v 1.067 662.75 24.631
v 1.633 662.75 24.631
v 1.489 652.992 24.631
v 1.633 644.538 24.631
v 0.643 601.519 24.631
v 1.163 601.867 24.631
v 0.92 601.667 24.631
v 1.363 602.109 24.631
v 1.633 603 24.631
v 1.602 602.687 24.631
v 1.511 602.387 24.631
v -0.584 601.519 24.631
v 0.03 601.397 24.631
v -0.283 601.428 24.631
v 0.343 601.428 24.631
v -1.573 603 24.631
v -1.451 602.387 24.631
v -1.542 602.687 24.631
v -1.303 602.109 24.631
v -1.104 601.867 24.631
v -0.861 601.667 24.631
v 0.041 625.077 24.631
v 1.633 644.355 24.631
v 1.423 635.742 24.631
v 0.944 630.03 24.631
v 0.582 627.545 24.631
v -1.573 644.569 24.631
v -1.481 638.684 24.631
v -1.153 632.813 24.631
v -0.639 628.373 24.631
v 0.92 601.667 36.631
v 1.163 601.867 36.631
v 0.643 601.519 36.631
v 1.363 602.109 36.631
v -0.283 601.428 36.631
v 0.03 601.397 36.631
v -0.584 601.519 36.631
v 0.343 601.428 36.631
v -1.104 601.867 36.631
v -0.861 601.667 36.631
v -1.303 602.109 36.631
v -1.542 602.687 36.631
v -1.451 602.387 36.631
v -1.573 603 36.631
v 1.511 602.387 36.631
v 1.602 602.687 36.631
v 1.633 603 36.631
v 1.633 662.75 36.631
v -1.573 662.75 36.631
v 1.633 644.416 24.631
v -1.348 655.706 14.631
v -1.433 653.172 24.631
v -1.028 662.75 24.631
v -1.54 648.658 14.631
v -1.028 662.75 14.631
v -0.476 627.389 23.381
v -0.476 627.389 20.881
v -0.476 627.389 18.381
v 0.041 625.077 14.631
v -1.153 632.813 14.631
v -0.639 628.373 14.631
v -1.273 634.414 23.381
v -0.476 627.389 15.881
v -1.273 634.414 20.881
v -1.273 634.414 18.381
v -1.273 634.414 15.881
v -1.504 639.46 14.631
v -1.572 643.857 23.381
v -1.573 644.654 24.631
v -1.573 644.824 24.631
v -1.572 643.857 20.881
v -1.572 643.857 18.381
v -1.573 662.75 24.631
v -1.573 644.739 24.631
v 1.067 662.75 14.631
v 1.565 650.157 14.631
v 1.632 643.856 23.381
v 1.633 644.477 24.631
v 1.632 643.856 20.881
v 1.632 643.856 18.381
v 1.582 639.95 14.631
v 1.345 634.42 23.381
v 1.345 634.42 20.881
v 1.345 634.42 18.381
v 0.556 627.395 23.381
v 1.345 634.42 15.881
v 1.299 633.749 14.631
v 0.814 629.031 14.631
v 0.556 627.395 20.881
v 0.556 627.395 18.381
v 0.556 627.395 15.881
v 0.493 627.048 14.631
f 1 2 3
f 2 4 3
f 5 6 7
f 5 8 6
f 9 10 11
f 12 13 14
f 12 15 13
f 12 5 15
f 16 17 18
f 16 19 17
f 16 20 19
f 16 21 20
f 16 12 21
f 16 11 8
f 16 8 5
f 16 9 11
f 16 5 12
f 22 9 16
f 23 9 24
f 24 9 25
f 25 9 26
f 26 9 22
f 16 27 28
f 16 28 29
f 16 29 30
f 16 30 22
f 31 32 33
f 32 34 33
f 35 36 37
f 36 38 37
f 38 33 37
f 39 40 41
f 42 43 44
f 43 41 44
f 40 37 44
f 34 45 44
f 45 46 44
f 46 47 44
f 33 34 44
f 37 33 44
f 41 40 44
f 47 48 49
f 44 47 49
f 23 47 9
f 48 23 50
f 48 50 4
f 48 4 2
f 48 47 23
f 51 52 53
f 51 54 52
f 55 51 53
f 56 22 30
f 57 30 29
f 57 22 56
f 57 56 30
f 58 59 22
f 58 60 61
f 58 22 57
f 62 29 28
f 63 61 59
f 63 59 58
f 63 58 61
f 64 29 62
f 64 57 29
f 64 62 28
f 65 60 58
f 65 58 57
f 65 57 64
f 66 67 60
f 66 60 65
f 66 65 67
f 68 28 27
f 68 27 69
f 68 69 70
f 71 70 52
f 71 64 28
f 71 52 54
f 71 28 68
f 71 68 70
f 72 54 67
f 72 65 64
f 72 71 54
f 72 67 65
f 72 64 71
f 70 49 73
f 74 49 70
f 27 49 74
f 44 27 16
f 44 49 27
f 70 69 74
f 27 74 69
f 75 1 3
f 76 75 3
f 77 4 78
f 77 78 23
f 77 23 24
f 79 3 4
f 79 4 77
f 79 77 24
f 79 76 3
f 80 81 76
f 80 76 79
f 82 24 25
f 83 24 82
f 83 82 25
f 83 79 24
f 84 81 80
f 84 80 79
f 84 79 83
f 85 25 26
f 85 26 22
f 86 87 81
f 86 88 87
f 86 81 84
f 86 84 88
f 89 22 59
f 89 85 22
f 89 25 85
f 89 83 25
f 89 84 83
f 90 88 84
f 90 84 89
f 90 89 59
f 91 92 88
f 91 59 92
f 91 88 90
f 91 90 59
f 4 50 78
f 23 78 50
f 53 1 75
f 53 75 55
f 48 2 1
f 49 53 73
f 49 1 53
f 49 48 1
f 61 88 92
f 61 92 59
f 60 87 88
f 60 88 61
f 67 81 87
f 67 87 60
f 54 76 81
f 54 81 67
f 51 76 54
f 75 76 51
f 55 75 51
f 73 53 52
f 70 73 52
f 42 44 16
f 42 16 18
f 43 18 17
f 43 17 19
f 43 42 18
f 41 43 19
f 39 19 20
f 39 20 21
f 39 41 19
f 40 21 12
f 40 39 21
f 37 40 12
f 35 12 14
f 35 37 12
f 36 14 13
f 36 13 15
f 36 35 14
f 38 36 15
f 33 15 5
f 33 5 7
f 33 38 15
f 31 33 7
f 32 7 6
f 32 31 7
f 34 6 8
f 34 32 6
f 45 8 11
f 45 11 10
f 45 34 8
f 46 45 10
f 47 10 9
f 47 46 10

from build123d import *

# Parameters (mm, degrees)
BOSS_EXTRUDE1_DEPTH = 12
BOSS_EXTRUDE2_DEPTH = 10
SKETCH4_W           = 13.751659717
SKETCH4_H           = 46.366215506
CUT_EXTRUDE1_DEPTH  = 10
SKETCH5_W           = 8.283570047
SKETCH5_H           = 65.91855038
CUT_EXTRUDE2_DEPTH  = 12


with BuildPart() as part:
    # Sketch2 → Boss-Extrude1 (new body)
    with BuildSketch(Plane(origin=(0, 0, 24.631338753), x_dir=(-1, 0, 0), z_dir=(0, 0, -1))):
        with BuildLine():
            Line((1.823068058, 603), (1.823068058, 663))
            Line((1.823068058, 663), (-1.882857166, 663))
            Line((-1.882857166, 663), (-1.882857166, 603))
            ThreePointArc((-1.882857166, 603), (-0.029894554, 601.147037388), (1.823068058, 603))
        make_face()
    extrude(amount=-BOSS_EXTRUDE1_DEPTH)

    # Sketch3 → Boss-Extrude2 (add)
    with BuildSketch(Plane(origin=(0, 0, 24.631338753), x_dir=(-1, 0, 0), z_dir=(0, 0, -1))):
        with BuildLine():
            Line((1.264894076, 663), (-1.303734146, 663))
            add(Edge.make_bspline(
                [(-1.303734146, 663), (-1.370231135, 661.776635062), (-1.590250356, 657.449713113), (-1.807353062, 651.572171687), (-1.896585428, 645.372497792), (-1.86904968, 640.732879739), (-1.745534221, 636.874692995), (-1.562088565, 633.805492743), (-1.371788238, 631.514699269), (-1.110556109, 629.246267473), (-0.82006967, 627.376977333), (-0.524480825, 625.91989796), (-0.290142677, 624.999996337), (-0.11575841, 624.480032386), (-0.0414459, 624.290359908)],
                knots=[0.640306561, 0.640306561, 0.640306561, 0.640306561, 0.664641164, 0.726373771, 0.757240075, 0.788106379, 0.818972683, 0.834405835, 0.849838987, 0.865272139, 0.88070529, 0.888421866, 0.896138442, 0.901180622, 0.901180622, 0.901180622, 0.901180622], degree=3))
            add(Edge.make_bspline(
                [(-0.0414459, 624.290359908), (0.033082795, 624.479947544), (0.208059728, 624.999712352), (0.443446447, 625.919346223), (0.740696225, 627.376087666), (1.033313538, 629.245045426), (1.297131595, 631.513177934), (1.490043391, 633.803752969), (1.676987934, 636.872742091), (1.804901792, 640.730785516), (1.837726863, 645.370369162), (1.755562421, 651.570140757), (1.545143008, 657.448413886), (1.33002573, 661.776072077), (1.264894076, 663)],
                knots=[0.516530112, 0.516530112, 0.516530112, 0.516530112, 0.521572291, 0.529288867, 0.537005443, 0.552438595, 0.567871747, 0.583304899, 0.598738051, 0.629604354, 0.660470658, 0.691336962, 0.75306957, 0.777413882, 0.777413882, 0.777413882, 0.777413882], degree=3))
        make_face()
    extrude(amount=BOSS_EXTRUDE2_DEPTH)

    # Sketch4 → Cut-Extrude1 (cut)
    with BuildSketch(Plane(origin=(0, 0, 14.631338753), x_dir=(-1, 0, 0), z_dir=(0, 0, -1))):
        with Locations((-1.173878519, 643.806595501)):
            Rectangle(SKETCH4_W, SKETCH4_H)
        with BuildLine():
            Line((1.027790464, 662.75), (-1.066900471, 662.75))
            add(Edge.make_bspline(
                [(-1.066900471, 662.75), (-1.236503852, 659.603485126), (-1.378670819, 656.455796636), (-1.57969897, 650.156856184), (-1.640644161, 647.006539015), (-1.627793637, 642.280065577), (-1.605967013, 640.704411435), (-1.51576118, 637.5585905), (-1.447339544, 635.987803899), (-1.241955745, 632.852473359), (-1.105208785, 631.287909819), (-0.807374159, 628.949508907), (-0.693510346, 628.171370392), (-0.487056782, 627.00741033), (-0.412632368, 626.619934288), (-0.245133833, 625.846680816), (-0.152824444, 625.460833735), (-0.040997635, 625.076764299)],
                knots=[0, 0, 0, 0, 0.25, 0.25, 0.5, 0.5, 0.625, 0.625, 0.75, 0.75, 0.875, 0.875, 0.9375, 0.9375, 0.96875, 0.96875, 1, 1, 1, 1], degree=3))
            add(Edge.make_bspline(
                [(-0.040997635, 625.076764299), (0.070840901, 625.459248905), (0.163415052, 625.843948539), (0.33153675, 626.615305535), (0.406338832, 627.002048611), (0.614008944, 628.164202165), (0.728805435, 628.941690519), (1.029518166, 631.279177553), (1.168319449, 632.844593533), (1.37765883, 635.983274427), (1.448032565, 637.557347723), (1.541893042, 640.707003283), (1.565447656, 642.281912238), (1.583609245, 647.006821426), (1.526236009, 650.157618773), (1.332376457, 656.455957525), (1.193802364, 659.603511067), (1.027790464, 662.75)],
                knots=[0, 0, 0, 0, 0.03125, 0.03125, 0.0625, 0.0625, 0.125, 0.125, 0.25, 0.25, 0.375, 0.375, 0.5, 0.5, 0.75, 0.75, 1, 1, 1, 1], degree=3))
        make_face(mode=Mode.SUBTRACT)
    extrude(amount=-CUT_EXTRUDE1_DEPTH, mode=Mode.SUBTRACT)

    # Sketch5 → Cut-Extrude2 (cut)
    with BuildSketch(Plane.XY.offset(36.631338753)):
        with Locations((0.019038526, 632.037504846)):
            Rectangle(SKETCH5_W, SKETCH5_H)
        with BuildLine():
            Line((1.632857166, 603), (1.632857166, 662.75))
            Line((1.632857166, 662.75), (-1.573068058, 662.75))
            Line((-1.573068058, 662.75), (-1.573068058, 603))
            ThreePointArc((-1.573068058, 603), (0.029894554, 601.397037388), (1.632857166, 603))
        make_face(mode=Mode.SUBTRACT)
    extrude(amount=-CUT_EXTRUDE2_DEPTH, mode=Mode.SUBTRACT)


solid = part.part
